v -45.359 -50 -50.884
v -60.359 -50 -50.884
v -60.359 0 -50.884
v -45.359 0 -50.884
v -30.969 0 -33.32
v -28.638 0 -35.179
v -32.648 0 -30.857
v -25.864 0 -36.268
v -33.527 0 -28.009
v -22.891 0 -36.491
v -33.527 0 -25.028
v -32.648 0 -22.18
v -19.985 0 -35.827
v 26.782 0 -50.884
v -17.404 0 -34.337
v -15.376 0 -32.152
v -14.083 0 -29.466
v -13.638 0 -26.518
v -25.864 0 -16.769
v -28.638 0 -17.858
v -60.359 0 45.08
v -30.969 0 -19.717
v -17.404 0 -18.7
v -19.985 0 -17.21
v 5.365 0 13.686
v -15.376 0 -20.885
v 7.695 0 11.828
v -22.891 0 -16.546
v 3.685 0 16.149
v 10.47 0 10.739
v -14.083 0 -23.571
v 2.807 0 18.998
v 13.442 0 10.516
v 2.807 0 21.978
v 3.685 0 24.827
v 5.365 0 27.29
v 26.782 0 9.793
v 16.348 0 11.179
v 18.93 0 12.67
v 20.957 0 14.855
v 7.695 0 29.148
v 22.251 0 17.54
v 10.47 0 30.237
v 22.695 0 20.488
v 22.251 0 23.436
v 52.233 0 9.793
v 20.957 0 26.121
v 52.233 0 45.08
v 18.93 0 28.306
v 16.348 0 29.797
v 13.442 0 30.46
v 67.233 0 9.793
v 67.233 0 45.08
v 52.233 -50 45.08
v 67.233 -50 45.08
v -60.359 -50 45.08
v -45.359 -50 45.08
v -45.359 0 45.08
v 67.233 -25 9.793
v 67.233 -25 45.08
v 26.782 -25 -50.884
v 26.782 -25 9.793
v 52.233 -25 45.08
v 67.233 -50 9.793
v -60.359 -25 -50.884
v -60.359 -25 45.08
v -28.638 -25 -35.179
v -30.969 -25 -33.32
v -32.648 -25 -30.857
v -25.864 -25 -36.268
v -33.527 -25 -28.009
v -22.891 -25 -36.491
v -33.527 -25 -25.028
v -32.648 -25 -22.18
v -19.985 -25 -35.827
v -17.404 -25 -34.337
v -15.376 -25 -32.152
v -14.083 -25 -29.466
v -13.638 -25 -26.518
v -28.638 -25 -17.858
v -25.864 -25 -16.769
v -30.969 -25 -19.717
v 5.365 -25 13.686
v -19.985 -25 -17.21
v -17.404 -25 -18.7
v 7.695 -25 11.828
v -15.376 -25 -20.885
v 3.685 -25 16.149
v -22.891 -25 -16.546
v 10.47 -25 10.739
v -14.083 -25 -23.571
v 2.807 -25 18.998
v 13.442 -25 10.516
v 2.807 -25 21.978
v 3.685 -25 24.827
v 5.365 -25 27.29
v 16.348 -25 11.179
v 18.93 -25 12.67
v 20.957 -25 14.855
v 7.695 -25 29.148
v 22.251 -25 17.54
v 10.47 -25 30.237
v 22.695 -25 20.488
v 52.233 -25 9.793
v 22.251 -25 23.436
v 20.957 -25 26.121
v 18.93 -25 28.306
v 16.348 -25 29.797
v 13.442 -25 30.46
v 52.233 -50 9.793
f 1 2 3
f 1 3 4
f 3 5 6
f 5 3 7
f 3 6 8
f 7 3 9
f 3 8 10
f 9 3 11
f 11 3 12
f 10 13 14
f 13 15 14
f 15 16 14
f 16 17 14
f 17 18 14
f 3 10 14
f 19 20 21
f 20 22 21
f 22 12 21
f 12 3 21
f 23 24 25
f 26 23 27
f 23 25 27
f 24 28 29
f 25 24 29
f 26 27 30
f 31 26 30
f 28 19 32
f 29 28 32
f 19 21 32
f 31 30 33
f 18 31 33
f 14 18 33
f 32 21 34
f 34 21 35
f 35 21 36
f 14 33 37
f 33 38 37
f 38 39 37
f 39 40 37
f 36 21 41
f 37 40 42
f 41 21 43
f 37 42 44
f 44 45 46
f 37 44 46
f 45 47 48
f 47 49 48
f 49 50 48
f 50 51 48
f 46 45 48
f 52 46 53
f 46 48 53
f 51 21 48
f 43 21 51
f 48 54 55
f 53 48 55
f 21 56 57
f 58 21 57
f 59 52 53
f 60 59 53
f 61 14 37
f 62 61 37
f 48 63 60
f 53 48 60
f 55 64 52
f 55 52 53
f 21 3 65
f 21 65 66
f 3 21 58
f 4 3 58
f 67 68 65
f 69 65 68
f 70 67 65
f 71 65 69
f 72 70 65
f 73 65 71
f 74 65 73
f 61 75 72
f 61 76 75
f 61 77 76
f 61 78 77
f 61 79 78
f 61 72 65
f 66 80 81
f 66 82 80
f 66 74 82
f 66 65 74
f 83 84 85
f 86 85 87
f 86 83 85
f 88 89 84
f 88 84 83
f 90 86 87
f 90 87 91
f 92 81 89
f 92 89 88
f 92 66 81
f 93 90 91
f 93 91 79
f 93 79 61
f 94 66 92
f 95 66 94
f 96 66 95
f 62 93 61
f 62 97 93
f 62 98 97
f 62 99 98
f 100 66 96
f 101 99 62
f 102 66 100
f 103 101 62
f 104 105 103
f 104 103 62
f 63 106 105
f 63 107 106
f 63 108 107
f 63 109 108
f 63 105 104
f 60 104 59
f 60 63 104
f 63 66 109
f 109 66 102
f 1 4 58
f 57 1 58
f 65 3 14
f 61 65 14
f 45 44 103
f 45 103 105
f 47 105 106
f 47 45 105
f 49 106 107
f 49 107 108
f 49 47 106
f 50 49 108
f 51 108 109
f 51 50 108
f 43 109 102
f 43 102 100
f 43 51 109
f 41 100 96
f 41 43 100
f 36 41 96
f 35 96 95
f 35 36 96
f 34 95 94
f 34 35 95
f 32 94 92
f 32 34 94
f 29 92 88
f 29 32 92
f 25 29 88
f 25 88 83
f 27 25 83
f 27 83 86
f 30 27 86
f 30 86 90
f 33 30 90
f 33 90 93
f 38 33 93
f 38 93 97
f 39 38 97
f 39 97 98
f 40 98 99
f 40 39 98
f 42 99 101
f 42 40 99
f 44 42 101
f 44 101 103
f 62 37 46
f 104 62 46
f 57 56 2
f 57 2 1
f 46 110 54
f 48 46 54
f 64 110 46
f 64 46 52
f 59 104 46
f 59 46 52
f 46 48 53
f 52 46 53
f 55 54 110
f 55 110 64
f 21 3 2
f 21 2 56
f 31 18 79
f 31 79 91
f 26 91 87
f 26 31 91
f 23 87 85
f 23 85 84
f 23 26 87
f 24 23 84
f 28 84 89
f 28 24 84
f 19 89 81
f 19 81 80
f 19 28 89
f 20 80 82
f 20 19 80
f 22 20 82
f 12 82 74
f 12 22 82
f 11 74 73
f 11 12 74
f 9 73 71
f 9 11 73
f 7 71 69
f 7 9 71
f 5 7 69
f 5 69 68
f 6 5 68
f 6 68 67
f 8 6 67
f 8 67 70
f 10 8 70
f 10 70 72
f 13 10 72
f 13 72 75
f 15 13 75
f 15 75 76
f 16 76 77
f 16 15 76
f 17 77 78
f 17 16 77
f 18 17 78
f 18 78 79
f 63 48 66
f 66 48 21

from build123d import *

# Parameters (mm, degrees)
F0_W     = 15
F0_H     = 95.963076
F0_H_2   = 35.286873
F1_DEPTH = 50
F0_R     = 10
F2_DEPTH = 25


with BuildPart() as f1:
    # F0 (on Front) → F1 (new body)
    with BuildSketch(Plane.XZ):
        with Locations((-52.858899, -2.901991)):
            Rectangle(F0_W, F0_H)
        with Locations((59.733263, 27.43611)):
            Rectangle(F0_W, F0_H_2)
    extrude(amount=F1_DEPTH)


with BuildPart() as f2:
    # F0 (on Front) → F2 (new body)
    with BuildSketch(Plane.XZ):
        with Locations((-52.858899, -2.901991)):
            Rectangle(F0_W, F0_H)
        Polygon((52.233263, 45.079547), (-45.358899, 45.079547), (-45.358899, -50.883529), (26.782462, -50.883529), (26.782462, 9.792674), (52.233263, 9.792674), align=None)
        with Locations((-23.638461, -26.51849)):
            Circle(F0_R, mode=Mode.SUBTRACT)
        with Locations((12.695081, 20.488029)):
            Circle(F0_R, mode=Mode.SUBTRACT)
        with Locations((59.733263, 27.43611)):
            Rectangle(F0_W, F0_H_2)
    extrude(amount=F2_DEPTH)


solid = Compound([f1.part, f2.part])
